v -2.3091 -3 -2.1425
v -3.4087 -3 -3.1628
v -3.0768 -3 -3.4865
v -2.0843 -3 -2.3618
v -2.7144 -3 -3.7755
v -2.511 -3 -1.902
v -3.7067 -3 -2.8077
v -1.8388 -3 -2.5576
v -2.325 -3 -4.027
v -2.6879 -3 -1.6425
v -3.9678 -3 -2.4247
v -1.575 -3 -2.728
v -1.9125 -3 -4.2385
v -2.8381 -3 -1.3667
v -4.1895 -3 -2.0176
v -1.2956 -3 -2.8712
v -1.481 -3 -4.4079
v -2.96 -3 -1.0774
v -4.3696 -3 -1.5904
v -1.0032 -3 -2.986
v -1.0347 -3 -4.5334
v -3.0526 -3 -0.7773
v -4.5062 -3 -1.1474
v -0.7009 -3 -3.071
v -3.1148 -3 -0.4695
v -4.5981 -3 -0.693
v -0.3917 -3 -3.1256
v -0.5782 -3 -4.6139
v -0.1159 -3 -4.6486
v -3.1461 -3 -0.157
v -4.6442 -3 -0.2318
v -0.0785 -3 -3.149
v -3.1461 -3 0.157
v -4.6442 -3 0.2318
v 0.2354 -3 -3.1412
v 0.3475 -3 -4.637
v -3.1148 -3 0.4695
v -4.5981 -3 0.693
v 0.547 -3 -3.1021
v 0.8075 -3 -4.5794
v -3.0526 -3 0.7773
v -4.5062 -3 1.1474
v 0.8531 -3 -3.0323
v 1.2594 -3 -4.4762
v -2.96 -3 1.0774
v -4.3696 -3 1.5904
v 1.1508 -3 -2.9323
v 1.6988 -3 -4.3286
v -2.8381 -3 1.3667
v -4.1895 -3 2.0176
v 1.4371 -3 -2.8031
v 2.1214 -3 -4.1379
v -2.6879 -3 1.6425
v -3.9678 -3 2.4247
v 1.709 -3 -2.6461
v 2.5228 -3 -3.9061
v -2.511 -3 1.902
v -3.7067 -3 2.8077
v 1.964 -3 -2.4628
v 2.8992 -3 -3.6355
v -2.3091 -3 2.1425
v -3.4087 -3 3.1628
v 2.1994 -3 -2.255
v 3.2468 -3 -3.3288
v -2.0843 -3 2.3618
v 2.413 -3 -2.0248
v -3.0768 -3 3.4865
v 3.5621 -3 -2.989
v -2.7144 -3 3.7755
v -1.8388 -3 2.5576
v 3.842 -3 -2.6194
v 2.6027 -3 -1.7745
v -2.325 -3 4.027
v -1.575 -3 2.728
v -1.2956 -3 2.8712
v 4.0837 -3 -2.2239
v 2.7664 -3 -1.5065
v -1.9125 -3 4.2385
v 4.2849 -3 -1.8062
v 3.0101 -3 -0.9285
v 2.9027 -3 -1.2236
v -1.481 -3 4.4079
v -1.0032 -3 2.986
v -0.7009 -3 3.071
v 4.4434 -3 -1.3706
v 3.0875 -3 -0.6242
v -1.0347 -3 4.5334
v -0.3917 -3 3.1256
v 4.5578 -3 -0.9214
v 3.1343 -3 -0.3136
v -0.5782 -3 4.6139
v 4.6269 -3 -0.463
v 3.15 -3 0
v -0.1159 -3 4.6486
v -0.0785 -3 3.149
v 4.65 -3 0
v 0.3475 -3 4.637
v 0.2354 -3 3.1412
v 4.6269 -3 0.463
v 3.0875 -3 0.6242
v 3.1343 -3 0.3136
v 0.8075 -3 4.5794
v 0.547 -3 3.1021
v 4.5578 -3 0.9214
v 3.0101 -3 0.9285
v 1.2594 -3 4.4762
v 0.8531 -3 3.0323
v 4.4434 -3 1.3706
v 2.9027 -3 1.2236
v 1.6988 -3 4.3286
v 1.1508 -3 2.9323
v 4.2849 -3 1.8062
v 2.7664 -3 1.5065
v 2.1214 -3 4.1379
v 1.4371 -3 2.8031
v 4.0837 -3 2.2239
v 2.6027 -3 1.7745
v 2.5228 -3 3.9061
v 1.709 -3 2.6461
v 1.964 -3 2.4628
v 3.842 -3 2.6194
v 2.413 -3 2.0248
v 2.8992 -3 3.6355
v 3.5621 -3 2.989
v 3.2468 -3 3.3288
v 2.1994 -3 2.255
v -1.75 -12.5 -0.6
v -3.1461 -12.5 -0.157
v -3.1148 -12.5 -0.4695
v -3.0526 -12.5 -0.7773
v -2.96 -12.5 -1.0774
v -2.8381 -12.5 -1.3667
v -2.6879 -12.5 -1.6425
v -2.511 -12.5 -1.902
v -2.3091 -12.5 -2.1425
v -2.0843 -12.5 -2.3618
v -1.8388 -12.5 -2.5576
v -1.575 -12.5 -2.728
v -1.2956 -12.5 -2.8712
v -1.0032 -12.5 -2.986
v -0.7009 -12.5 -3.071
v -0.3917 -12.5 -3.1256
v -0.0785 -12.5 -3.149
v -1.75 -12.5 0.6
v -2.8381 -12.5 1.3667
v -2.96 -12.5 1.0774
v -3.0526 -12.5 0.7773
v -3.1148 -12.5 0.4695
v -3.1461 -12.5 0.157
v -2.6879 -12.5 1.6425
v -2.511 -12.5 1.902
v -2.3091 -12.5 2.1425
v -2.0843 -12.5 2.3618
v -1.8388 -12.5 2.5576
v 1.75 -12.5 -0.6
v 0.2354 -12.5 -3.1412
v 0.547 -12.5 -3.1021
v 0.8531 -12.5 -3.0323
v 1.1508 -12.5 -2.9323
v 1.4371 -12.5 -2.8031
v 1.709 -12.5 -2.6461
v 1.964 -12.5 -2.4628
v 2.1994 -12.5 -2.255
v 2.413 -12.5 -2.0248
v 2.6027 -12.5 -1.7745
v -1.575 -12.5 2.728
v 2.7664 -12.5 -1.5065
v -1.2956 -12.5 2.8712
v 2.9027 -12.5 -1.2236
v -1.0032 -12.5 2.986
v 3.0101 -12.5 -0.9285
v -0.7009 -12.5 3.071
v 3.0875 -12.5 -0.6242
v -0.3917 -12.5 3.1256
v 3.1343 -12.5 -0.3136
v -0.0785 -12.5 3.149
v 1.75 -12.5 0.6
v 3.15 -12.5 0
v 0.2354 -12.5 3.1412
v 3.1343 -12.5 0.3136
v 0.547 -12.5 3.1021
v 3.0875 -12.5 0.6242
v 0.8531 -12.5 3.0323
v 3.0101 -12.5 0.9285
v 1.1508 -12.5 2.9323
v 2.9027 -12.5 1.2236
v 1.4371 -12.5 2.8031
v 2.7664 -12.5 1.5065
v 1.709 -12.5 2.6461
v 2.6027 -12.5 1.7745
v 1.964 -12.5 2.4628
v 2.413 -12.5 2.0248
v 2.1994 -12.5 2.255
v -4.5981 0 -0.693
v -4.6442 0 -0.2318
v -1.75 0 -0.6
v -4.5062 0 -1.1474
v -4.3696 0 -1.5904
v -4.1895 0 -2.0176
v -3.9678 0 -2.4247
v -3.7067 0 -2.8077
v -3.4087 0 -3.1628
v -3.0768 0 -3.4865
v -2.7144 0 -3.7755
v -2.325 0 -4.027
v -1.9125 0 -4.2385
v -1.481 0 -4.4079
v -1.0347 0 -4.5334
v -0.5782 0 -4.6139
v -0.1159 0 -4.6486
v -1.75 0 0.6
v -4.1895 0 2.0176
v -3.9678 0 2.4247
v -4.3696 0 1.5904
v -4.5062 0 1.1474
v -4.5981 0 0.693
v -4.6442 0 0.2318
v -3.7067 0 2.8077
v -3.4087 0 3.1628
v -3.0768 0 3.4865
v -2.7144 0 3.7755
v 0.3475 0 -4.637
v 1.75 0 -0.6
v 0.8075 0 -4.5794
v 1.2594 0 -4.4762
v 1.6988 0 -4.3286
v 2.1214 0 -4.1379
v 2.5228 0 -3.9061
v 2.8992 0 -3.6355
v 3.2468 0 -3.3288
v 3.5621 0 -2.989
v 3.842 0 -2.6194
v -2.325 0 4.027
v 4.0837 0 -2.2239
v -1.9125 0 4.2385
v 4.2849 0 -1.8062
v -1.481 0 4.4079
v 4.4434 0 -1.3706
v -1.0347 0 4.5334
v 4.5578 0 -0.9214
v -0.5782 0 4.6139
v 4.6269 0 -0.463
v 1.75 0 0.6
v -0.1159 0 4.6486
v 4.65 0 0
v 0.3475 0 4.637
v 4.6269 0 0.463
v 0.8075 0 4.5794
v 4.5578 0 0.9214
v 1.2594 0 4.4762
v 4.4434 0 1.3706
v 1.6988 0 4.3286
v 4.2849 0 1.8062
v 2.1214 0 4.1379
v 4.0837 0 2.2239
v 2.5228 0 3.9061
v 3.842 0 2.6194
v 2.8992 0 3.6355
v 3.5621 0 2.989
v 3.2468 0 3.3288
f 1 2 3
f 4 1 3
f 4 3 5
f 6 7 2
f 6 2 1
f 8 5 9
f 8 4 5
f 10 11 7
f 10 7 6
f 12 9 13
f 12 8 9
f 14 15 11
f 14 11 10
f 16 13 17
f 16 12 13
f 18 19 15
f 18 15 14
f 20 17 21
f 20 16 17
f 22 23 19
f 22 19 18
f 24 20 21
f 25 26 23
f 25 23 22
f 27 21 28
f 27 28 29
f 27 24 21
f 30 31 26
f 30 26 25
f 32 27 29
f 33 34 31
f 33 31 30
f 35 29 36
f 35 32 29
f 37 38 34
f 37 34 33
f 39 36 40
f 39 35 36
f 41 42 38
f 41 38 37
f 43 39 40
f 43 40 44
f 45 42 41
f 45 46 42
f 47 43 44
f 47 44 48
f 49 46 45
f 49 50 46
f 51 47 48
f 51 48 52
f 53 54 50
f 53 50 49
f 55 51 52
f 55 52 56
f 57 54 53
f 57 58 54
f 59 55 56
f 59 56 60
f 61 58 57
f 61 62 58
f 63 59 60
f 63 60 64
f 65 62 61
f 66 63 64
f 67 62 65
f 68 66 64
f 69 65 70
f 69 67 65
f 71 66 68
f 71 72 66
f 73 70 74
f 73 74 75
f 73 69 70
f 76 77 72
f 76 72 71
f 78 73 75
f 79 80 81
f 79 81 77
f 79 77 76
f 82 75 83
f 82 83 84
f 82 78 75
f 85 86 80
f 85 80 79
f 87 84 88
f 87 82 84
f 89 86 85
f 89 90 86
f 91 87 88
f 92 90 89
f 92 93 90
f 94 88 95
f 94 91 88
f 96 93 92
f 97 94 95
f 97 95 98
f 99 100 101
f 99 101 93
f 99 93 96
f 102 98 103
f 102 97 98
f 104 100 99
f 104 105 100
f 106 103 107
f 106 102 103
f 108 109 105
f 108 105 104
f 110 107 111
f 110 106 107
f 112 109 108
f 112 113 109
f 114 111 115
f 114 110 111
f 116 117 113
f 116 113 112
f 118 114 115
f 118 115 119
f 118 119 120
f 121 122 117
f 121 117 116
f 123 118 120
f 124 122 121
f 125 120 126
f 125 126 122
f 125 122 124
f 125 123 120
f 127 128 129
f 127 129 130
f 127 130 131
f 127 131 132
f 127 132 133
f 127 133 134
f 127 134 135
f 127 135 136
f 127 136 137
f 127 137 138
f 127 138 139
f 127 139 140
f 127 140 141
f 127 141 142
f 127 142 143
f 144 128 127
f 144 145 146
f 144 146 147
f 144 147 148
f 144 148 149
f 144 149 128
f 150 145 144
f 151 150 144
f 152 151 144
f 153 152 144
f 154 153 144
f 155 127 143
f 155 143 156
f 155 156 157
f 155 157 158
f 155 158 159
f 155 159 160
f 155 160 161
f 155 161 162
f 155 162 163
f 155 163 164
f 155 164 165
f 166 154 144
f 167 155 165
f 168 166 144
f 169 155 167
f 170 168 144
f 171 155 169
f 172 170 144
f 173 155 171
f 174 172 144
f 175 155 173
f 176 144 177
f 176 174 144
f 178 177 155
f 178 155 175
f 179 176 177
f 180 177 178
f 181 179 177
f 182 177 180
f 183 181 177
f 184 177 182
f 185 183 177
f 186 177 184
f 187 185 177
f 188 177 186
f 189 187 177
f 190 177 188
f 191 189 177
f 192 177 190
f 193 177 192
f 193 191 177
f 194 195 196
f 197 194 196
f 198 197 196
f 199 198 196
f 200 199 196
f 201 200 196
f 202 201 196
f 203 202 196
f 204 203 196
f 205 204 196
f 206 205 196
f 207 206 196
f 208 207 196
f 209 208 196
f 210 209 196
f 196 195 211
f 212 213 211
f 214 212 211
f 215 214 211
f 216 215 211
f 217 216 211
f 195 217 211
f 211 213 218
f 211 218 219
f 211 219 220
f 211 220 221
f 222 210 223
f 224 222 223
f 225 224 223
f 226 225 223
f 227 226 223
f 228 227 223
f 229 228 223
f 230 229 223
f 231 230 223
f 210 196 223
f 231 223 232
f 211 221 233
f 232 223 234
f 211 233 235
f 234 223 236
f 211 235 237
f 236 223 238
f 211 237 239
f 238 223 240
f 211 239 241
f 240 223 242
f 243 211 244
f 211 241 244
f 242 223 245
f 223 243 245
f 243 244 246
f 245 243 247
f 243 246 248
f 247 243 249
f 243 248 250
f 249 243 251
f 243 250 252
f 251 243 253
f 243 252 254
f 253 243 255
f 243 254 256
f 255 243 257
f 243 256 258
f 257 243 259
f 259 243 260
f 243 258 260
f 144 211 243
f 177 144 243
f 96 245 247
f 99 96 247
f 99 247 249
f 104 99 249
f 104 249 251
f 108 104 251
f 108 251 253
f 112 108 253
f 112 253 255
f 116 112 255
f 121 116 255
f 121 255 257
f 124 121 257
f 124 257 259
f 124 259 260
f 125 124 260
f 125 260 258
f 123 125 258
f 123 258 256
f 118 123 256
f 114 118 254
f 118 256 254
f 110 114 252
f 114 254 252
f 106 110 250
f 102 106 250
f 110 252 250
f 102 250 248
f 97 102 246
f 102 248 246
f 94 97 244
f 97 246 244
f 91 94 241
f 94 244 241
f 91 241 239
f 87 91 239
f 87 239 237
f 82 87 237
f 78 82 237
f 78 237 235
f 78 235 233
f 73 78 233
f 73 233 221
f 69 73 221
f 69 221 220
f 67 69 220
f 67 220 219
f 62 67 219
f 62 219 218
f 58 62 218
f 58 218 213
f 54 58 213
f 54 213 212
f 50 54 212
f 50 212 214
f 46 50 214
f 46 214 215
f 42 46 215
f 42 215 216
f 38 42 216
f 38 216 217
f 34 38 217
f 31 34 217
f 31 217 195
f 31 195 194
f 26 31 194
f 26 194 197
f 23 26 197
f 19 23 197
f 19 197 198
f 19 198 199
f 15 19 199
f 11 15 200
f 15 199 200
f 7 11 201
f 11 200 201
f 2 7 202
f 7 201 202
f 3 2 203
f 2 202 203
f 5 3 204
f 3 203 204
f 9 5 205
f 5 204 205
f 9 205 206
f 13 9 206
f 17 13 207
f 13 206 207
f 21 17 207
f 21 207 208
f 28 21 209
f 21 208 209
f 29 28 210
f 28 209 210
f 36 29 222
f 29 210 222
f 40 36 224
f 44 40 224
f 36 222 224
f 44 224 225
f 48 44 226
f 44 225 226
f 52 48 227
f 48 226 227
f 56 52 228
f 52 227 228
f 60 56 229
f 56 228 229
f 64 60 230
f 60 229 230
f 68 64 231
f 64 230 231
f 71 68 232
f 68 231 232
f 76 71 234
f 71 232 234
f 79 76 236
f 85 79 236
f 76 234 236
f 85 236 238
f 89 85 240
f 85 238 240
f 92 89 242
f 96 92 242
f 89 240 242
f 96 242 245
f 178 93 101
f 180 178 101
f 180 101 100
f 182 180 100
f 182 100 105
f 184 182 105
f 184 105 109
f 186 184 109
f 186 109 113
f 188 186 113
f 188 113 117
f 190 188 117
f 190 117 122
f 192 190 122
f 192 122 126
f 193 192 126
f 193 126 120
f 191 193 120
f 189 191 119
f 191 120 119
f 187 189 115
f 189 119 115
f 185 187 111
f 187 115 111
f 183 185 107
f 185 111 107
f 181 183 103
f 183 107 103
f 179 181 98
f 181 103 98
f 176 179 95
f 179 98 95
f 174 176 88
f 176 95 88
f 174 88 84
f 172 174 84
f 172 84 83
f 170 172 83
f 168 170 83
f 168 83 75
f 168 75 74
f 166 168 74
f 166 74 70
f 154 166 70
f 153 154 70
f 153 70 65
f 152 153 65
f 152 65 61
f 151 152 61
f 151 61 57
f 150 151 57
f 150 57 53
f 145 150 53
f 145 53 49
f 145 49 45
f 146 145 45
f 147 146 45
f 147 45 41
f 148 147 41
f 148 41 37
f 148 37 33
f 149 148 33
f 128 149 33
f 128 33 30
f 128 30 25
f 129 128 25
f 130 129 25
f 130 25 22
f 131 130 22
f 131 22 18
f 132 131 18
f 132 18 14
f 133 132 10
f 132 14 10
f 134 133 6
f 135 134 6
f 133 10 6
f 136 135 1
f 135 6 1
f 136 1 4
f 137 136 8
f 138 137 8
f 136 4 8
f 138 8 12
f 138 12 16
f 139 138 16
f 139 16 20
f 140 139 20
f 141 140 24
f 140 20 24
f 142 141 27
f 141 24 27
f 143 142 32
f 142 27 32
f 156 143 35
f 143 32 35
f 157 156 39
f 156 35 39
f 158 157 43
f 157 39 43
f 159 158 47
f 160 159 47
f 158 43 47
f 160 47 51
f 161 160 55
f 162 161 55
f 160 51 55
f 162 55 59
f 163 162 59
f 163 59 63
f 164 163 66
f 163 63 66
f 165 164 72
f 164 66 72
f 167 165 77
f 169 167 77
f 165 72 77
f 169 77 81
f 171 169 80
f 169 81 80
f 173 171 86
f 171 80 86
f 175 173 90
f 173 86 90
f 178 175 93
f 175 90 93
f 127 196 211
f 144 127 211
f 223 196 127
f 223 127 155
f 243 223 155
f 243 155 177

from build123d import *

# Parameters (mm, degrees)
F0_R     = 4.65
F0_R_2   = 3.15
F0_W     = 3.5
F0_H     = 1.2
F1_DEPTH = 2
F2_DEPTH = 3
F3_DEPTH = 12.5


with BuildPart() as f1:
    # F0 (on Front) → F1 (new body)
    with BuildSketch(Plane.XZ):
        Circle(F0_R)
        Circle(F0_R_2, mode=Mode.SUBTRACT)
        Circle(F0_R_2)
        Rectangle(F0_W, F0_H, mode=Mode.SUBTRACT)
    extrude(amount=F1_DEPTH)

    # F0 (on Front) → F2 (join)
    with BuildSketch(Plane.XZ):
        Circle(F0_R)
        Circle(F0_R_2, mode=Mode.SUBTRACT)
        Circle(F0_R_2)
        Rectangle(F0_W, F0_H, mode=Mode.SUBTRACT)
    extrude(amount=F2_DEPTH)

    # F0 (on Front) → F3 (join)
    with BuildSketch(Plane.XZ):
        Circle(F0_R_2)
        Rectangle(F0_W, F0_H, mode=Mode.SUBTRACT)
    extrude(amount=F3_DEPTH)


solid = f1.part
